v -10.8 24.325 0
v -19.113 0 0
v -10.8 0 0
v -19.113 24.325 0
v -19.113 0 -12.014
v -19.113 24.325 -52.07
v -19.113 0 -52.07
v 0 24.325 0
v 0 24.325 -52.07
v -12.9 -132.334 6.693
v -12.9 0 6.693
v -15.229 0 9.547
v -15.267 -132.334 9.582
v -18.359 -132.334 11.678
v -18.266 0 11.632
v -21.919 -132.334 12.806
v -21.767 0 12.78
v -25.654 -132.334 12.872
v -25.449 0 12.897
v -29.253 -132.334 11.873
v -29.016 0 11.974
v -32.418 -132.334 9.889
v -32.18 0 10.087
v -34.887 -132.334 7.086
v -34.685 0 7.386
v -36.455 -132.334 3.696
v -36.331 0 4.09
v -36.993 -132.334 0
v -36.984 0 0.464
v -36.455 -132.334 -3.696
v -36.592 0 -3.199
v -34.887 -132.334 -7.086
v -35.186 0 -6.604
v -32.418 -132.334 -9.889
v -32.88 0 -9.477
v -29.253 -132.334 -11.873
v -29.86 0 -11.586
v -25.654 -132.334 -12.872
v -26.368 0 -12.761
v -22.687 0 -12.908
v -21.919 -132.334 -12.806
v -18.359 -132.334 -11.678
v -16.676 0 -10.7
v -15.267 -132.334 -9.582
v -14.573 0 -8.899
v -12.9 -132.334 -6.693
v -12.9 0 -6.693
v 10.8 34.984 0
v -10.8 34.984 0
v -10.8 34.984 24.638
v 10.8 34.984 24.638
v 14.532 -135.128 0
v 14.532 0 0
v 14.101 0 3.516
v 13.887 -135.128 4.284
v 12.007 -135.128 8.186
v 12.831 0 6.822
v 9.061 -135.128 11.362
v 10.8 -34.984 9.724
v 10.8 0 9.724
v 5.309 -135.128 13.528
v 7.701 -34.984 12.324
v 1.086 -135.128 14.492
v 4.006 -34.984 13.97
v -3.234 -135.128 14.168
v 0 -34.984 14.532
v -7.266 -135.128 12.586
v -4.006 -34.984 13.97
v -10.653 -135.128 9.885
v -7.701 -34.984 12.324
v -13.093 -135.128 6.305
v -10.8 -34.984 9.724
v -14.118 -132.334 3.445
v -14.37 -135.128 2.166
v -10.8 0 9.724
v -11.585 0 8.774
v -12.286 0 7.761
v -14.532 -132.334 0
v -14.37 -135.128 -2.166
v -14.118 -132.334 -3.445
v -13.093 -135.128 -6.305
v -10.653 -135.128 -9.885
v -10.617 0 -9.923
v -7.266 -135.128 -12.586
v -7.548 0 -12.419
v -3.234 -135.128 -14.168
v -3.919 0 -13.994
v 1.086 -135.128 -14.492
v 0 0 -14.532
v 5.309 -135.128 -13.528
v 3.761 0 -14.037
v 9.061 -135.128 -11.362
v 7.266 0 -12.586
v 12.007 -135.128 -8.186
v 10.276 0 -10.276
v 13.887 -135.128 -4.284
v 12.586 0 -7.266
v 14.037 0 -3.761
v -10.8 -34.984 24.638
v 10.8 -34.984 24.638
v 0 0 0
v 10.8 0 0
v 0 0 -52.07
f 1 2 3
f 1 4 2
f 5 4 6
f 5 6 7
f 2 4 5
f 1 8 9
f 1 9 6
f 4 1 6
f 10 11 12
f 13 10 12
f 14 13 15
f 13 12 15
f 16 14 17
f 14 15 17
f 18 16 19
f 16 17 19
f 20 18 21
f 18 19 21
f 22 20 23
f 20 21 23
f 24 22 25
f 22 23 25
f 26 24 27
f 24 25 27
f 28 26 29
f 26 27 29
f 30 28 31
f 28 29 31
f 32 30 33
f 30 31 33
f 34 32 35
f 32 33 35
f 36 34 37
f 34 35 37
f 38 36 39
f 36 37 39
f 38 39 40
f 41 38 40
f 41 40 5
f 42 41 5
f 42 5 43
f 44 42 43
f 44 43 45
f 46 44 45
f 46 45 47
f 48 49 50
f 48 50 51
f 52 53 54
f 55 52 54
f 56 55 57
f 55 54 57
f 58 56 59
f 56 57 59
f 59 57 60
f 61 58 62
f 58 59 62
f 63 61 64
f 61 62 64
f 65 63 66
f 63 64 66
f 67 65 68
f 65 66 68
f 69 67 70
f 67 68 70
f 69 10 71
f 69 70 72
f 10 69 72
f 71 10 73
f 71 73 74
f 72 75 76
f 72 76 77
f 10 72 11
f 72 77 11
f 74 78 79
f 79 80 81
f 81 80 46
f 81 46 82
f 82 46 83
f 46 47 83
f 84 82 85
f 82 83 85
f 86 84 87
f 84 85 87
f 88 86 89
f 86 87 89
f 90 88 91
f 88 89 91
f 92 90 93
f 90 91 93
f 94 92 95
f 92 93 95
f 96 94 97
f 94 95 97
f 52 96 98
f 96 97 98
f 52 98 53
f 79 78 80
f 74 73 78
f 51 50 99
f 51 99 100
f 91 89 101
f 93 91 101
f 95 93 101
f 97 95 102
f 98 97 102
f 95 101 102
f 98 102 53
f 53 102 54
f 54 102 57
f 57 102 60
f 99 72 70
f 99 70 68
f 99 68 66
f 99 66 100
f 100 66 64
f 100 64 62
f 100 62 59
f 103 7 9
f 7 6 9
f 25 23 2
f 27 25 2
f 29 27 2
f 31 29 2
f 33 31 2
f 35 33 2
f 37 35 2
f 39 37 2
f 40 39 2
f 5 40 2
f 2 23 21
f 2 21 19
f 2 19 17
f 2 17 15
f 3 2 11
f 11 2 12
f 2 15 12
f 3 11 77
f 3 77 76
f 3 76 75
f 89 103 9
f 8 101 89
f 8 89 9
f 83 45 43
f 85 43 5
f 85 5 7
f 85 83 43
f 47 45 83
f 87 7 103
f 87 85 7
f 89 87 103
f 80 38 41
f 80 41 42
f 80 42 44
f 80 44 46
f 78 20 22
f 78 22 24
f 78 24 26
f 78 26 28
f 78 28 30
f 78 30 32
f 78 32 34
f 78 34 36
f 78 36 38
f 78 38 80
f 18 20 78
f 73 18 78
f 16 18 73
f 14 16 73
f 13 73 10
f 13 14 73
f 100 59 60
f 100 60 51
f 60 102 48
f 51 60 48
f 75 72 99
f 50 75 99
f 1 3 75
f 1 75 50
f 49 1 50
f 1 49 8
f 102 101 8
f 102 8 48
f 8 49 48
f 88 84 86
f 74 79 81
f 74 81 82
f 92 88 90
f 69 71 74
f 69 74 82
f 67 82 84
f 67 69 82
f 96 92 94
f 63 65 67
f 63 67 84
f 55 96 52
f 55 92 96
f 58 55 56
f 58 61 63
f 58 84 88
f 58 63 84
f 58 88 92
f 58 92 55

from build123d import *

# Parameters (mm, degrees)
F0_R     = 14.532496
F1_DEPTH = 135.128
F2_W     = 21.599732
F2_H     = 69.967128
F3_DEPTH = 24.638
F5_DEPTH = 52.07
F6_R     = 12.97612
F7_DEPTH = 132.334


with BuildPart() as f1:
    # F0 (on Front) → F1 (new body)
    with BuildSketch(Plane.XZ):
        Circle(F0_R)
    extrude(amount=F1_DEPTH)

    # F2 (on Top) → F3 (join)
    with BuildSketch(Plane.XY):
        Rectangle(F2_W, F2_H)
    extrude(amount=F3_DEPTH)

    # F4 (on Top) → F5 (join)
    with BuildSketch(Plane.XY):
        Polygon((-19.11266, 0), (0, 0), (0, 24.325365), (-19.11266, 24.325365), (-19.11266, 3.464378), align=None)
    extrude(amount=-F5_DEPTH)

    # F6 (on Front) → F7 (join)
    with BuildSketch(Plane.XZ):
        with Locations((-24.016608, 0)):
            Circle(F6_R)
    extrude(amount=F7_DEPTH)


solid = f1.part
